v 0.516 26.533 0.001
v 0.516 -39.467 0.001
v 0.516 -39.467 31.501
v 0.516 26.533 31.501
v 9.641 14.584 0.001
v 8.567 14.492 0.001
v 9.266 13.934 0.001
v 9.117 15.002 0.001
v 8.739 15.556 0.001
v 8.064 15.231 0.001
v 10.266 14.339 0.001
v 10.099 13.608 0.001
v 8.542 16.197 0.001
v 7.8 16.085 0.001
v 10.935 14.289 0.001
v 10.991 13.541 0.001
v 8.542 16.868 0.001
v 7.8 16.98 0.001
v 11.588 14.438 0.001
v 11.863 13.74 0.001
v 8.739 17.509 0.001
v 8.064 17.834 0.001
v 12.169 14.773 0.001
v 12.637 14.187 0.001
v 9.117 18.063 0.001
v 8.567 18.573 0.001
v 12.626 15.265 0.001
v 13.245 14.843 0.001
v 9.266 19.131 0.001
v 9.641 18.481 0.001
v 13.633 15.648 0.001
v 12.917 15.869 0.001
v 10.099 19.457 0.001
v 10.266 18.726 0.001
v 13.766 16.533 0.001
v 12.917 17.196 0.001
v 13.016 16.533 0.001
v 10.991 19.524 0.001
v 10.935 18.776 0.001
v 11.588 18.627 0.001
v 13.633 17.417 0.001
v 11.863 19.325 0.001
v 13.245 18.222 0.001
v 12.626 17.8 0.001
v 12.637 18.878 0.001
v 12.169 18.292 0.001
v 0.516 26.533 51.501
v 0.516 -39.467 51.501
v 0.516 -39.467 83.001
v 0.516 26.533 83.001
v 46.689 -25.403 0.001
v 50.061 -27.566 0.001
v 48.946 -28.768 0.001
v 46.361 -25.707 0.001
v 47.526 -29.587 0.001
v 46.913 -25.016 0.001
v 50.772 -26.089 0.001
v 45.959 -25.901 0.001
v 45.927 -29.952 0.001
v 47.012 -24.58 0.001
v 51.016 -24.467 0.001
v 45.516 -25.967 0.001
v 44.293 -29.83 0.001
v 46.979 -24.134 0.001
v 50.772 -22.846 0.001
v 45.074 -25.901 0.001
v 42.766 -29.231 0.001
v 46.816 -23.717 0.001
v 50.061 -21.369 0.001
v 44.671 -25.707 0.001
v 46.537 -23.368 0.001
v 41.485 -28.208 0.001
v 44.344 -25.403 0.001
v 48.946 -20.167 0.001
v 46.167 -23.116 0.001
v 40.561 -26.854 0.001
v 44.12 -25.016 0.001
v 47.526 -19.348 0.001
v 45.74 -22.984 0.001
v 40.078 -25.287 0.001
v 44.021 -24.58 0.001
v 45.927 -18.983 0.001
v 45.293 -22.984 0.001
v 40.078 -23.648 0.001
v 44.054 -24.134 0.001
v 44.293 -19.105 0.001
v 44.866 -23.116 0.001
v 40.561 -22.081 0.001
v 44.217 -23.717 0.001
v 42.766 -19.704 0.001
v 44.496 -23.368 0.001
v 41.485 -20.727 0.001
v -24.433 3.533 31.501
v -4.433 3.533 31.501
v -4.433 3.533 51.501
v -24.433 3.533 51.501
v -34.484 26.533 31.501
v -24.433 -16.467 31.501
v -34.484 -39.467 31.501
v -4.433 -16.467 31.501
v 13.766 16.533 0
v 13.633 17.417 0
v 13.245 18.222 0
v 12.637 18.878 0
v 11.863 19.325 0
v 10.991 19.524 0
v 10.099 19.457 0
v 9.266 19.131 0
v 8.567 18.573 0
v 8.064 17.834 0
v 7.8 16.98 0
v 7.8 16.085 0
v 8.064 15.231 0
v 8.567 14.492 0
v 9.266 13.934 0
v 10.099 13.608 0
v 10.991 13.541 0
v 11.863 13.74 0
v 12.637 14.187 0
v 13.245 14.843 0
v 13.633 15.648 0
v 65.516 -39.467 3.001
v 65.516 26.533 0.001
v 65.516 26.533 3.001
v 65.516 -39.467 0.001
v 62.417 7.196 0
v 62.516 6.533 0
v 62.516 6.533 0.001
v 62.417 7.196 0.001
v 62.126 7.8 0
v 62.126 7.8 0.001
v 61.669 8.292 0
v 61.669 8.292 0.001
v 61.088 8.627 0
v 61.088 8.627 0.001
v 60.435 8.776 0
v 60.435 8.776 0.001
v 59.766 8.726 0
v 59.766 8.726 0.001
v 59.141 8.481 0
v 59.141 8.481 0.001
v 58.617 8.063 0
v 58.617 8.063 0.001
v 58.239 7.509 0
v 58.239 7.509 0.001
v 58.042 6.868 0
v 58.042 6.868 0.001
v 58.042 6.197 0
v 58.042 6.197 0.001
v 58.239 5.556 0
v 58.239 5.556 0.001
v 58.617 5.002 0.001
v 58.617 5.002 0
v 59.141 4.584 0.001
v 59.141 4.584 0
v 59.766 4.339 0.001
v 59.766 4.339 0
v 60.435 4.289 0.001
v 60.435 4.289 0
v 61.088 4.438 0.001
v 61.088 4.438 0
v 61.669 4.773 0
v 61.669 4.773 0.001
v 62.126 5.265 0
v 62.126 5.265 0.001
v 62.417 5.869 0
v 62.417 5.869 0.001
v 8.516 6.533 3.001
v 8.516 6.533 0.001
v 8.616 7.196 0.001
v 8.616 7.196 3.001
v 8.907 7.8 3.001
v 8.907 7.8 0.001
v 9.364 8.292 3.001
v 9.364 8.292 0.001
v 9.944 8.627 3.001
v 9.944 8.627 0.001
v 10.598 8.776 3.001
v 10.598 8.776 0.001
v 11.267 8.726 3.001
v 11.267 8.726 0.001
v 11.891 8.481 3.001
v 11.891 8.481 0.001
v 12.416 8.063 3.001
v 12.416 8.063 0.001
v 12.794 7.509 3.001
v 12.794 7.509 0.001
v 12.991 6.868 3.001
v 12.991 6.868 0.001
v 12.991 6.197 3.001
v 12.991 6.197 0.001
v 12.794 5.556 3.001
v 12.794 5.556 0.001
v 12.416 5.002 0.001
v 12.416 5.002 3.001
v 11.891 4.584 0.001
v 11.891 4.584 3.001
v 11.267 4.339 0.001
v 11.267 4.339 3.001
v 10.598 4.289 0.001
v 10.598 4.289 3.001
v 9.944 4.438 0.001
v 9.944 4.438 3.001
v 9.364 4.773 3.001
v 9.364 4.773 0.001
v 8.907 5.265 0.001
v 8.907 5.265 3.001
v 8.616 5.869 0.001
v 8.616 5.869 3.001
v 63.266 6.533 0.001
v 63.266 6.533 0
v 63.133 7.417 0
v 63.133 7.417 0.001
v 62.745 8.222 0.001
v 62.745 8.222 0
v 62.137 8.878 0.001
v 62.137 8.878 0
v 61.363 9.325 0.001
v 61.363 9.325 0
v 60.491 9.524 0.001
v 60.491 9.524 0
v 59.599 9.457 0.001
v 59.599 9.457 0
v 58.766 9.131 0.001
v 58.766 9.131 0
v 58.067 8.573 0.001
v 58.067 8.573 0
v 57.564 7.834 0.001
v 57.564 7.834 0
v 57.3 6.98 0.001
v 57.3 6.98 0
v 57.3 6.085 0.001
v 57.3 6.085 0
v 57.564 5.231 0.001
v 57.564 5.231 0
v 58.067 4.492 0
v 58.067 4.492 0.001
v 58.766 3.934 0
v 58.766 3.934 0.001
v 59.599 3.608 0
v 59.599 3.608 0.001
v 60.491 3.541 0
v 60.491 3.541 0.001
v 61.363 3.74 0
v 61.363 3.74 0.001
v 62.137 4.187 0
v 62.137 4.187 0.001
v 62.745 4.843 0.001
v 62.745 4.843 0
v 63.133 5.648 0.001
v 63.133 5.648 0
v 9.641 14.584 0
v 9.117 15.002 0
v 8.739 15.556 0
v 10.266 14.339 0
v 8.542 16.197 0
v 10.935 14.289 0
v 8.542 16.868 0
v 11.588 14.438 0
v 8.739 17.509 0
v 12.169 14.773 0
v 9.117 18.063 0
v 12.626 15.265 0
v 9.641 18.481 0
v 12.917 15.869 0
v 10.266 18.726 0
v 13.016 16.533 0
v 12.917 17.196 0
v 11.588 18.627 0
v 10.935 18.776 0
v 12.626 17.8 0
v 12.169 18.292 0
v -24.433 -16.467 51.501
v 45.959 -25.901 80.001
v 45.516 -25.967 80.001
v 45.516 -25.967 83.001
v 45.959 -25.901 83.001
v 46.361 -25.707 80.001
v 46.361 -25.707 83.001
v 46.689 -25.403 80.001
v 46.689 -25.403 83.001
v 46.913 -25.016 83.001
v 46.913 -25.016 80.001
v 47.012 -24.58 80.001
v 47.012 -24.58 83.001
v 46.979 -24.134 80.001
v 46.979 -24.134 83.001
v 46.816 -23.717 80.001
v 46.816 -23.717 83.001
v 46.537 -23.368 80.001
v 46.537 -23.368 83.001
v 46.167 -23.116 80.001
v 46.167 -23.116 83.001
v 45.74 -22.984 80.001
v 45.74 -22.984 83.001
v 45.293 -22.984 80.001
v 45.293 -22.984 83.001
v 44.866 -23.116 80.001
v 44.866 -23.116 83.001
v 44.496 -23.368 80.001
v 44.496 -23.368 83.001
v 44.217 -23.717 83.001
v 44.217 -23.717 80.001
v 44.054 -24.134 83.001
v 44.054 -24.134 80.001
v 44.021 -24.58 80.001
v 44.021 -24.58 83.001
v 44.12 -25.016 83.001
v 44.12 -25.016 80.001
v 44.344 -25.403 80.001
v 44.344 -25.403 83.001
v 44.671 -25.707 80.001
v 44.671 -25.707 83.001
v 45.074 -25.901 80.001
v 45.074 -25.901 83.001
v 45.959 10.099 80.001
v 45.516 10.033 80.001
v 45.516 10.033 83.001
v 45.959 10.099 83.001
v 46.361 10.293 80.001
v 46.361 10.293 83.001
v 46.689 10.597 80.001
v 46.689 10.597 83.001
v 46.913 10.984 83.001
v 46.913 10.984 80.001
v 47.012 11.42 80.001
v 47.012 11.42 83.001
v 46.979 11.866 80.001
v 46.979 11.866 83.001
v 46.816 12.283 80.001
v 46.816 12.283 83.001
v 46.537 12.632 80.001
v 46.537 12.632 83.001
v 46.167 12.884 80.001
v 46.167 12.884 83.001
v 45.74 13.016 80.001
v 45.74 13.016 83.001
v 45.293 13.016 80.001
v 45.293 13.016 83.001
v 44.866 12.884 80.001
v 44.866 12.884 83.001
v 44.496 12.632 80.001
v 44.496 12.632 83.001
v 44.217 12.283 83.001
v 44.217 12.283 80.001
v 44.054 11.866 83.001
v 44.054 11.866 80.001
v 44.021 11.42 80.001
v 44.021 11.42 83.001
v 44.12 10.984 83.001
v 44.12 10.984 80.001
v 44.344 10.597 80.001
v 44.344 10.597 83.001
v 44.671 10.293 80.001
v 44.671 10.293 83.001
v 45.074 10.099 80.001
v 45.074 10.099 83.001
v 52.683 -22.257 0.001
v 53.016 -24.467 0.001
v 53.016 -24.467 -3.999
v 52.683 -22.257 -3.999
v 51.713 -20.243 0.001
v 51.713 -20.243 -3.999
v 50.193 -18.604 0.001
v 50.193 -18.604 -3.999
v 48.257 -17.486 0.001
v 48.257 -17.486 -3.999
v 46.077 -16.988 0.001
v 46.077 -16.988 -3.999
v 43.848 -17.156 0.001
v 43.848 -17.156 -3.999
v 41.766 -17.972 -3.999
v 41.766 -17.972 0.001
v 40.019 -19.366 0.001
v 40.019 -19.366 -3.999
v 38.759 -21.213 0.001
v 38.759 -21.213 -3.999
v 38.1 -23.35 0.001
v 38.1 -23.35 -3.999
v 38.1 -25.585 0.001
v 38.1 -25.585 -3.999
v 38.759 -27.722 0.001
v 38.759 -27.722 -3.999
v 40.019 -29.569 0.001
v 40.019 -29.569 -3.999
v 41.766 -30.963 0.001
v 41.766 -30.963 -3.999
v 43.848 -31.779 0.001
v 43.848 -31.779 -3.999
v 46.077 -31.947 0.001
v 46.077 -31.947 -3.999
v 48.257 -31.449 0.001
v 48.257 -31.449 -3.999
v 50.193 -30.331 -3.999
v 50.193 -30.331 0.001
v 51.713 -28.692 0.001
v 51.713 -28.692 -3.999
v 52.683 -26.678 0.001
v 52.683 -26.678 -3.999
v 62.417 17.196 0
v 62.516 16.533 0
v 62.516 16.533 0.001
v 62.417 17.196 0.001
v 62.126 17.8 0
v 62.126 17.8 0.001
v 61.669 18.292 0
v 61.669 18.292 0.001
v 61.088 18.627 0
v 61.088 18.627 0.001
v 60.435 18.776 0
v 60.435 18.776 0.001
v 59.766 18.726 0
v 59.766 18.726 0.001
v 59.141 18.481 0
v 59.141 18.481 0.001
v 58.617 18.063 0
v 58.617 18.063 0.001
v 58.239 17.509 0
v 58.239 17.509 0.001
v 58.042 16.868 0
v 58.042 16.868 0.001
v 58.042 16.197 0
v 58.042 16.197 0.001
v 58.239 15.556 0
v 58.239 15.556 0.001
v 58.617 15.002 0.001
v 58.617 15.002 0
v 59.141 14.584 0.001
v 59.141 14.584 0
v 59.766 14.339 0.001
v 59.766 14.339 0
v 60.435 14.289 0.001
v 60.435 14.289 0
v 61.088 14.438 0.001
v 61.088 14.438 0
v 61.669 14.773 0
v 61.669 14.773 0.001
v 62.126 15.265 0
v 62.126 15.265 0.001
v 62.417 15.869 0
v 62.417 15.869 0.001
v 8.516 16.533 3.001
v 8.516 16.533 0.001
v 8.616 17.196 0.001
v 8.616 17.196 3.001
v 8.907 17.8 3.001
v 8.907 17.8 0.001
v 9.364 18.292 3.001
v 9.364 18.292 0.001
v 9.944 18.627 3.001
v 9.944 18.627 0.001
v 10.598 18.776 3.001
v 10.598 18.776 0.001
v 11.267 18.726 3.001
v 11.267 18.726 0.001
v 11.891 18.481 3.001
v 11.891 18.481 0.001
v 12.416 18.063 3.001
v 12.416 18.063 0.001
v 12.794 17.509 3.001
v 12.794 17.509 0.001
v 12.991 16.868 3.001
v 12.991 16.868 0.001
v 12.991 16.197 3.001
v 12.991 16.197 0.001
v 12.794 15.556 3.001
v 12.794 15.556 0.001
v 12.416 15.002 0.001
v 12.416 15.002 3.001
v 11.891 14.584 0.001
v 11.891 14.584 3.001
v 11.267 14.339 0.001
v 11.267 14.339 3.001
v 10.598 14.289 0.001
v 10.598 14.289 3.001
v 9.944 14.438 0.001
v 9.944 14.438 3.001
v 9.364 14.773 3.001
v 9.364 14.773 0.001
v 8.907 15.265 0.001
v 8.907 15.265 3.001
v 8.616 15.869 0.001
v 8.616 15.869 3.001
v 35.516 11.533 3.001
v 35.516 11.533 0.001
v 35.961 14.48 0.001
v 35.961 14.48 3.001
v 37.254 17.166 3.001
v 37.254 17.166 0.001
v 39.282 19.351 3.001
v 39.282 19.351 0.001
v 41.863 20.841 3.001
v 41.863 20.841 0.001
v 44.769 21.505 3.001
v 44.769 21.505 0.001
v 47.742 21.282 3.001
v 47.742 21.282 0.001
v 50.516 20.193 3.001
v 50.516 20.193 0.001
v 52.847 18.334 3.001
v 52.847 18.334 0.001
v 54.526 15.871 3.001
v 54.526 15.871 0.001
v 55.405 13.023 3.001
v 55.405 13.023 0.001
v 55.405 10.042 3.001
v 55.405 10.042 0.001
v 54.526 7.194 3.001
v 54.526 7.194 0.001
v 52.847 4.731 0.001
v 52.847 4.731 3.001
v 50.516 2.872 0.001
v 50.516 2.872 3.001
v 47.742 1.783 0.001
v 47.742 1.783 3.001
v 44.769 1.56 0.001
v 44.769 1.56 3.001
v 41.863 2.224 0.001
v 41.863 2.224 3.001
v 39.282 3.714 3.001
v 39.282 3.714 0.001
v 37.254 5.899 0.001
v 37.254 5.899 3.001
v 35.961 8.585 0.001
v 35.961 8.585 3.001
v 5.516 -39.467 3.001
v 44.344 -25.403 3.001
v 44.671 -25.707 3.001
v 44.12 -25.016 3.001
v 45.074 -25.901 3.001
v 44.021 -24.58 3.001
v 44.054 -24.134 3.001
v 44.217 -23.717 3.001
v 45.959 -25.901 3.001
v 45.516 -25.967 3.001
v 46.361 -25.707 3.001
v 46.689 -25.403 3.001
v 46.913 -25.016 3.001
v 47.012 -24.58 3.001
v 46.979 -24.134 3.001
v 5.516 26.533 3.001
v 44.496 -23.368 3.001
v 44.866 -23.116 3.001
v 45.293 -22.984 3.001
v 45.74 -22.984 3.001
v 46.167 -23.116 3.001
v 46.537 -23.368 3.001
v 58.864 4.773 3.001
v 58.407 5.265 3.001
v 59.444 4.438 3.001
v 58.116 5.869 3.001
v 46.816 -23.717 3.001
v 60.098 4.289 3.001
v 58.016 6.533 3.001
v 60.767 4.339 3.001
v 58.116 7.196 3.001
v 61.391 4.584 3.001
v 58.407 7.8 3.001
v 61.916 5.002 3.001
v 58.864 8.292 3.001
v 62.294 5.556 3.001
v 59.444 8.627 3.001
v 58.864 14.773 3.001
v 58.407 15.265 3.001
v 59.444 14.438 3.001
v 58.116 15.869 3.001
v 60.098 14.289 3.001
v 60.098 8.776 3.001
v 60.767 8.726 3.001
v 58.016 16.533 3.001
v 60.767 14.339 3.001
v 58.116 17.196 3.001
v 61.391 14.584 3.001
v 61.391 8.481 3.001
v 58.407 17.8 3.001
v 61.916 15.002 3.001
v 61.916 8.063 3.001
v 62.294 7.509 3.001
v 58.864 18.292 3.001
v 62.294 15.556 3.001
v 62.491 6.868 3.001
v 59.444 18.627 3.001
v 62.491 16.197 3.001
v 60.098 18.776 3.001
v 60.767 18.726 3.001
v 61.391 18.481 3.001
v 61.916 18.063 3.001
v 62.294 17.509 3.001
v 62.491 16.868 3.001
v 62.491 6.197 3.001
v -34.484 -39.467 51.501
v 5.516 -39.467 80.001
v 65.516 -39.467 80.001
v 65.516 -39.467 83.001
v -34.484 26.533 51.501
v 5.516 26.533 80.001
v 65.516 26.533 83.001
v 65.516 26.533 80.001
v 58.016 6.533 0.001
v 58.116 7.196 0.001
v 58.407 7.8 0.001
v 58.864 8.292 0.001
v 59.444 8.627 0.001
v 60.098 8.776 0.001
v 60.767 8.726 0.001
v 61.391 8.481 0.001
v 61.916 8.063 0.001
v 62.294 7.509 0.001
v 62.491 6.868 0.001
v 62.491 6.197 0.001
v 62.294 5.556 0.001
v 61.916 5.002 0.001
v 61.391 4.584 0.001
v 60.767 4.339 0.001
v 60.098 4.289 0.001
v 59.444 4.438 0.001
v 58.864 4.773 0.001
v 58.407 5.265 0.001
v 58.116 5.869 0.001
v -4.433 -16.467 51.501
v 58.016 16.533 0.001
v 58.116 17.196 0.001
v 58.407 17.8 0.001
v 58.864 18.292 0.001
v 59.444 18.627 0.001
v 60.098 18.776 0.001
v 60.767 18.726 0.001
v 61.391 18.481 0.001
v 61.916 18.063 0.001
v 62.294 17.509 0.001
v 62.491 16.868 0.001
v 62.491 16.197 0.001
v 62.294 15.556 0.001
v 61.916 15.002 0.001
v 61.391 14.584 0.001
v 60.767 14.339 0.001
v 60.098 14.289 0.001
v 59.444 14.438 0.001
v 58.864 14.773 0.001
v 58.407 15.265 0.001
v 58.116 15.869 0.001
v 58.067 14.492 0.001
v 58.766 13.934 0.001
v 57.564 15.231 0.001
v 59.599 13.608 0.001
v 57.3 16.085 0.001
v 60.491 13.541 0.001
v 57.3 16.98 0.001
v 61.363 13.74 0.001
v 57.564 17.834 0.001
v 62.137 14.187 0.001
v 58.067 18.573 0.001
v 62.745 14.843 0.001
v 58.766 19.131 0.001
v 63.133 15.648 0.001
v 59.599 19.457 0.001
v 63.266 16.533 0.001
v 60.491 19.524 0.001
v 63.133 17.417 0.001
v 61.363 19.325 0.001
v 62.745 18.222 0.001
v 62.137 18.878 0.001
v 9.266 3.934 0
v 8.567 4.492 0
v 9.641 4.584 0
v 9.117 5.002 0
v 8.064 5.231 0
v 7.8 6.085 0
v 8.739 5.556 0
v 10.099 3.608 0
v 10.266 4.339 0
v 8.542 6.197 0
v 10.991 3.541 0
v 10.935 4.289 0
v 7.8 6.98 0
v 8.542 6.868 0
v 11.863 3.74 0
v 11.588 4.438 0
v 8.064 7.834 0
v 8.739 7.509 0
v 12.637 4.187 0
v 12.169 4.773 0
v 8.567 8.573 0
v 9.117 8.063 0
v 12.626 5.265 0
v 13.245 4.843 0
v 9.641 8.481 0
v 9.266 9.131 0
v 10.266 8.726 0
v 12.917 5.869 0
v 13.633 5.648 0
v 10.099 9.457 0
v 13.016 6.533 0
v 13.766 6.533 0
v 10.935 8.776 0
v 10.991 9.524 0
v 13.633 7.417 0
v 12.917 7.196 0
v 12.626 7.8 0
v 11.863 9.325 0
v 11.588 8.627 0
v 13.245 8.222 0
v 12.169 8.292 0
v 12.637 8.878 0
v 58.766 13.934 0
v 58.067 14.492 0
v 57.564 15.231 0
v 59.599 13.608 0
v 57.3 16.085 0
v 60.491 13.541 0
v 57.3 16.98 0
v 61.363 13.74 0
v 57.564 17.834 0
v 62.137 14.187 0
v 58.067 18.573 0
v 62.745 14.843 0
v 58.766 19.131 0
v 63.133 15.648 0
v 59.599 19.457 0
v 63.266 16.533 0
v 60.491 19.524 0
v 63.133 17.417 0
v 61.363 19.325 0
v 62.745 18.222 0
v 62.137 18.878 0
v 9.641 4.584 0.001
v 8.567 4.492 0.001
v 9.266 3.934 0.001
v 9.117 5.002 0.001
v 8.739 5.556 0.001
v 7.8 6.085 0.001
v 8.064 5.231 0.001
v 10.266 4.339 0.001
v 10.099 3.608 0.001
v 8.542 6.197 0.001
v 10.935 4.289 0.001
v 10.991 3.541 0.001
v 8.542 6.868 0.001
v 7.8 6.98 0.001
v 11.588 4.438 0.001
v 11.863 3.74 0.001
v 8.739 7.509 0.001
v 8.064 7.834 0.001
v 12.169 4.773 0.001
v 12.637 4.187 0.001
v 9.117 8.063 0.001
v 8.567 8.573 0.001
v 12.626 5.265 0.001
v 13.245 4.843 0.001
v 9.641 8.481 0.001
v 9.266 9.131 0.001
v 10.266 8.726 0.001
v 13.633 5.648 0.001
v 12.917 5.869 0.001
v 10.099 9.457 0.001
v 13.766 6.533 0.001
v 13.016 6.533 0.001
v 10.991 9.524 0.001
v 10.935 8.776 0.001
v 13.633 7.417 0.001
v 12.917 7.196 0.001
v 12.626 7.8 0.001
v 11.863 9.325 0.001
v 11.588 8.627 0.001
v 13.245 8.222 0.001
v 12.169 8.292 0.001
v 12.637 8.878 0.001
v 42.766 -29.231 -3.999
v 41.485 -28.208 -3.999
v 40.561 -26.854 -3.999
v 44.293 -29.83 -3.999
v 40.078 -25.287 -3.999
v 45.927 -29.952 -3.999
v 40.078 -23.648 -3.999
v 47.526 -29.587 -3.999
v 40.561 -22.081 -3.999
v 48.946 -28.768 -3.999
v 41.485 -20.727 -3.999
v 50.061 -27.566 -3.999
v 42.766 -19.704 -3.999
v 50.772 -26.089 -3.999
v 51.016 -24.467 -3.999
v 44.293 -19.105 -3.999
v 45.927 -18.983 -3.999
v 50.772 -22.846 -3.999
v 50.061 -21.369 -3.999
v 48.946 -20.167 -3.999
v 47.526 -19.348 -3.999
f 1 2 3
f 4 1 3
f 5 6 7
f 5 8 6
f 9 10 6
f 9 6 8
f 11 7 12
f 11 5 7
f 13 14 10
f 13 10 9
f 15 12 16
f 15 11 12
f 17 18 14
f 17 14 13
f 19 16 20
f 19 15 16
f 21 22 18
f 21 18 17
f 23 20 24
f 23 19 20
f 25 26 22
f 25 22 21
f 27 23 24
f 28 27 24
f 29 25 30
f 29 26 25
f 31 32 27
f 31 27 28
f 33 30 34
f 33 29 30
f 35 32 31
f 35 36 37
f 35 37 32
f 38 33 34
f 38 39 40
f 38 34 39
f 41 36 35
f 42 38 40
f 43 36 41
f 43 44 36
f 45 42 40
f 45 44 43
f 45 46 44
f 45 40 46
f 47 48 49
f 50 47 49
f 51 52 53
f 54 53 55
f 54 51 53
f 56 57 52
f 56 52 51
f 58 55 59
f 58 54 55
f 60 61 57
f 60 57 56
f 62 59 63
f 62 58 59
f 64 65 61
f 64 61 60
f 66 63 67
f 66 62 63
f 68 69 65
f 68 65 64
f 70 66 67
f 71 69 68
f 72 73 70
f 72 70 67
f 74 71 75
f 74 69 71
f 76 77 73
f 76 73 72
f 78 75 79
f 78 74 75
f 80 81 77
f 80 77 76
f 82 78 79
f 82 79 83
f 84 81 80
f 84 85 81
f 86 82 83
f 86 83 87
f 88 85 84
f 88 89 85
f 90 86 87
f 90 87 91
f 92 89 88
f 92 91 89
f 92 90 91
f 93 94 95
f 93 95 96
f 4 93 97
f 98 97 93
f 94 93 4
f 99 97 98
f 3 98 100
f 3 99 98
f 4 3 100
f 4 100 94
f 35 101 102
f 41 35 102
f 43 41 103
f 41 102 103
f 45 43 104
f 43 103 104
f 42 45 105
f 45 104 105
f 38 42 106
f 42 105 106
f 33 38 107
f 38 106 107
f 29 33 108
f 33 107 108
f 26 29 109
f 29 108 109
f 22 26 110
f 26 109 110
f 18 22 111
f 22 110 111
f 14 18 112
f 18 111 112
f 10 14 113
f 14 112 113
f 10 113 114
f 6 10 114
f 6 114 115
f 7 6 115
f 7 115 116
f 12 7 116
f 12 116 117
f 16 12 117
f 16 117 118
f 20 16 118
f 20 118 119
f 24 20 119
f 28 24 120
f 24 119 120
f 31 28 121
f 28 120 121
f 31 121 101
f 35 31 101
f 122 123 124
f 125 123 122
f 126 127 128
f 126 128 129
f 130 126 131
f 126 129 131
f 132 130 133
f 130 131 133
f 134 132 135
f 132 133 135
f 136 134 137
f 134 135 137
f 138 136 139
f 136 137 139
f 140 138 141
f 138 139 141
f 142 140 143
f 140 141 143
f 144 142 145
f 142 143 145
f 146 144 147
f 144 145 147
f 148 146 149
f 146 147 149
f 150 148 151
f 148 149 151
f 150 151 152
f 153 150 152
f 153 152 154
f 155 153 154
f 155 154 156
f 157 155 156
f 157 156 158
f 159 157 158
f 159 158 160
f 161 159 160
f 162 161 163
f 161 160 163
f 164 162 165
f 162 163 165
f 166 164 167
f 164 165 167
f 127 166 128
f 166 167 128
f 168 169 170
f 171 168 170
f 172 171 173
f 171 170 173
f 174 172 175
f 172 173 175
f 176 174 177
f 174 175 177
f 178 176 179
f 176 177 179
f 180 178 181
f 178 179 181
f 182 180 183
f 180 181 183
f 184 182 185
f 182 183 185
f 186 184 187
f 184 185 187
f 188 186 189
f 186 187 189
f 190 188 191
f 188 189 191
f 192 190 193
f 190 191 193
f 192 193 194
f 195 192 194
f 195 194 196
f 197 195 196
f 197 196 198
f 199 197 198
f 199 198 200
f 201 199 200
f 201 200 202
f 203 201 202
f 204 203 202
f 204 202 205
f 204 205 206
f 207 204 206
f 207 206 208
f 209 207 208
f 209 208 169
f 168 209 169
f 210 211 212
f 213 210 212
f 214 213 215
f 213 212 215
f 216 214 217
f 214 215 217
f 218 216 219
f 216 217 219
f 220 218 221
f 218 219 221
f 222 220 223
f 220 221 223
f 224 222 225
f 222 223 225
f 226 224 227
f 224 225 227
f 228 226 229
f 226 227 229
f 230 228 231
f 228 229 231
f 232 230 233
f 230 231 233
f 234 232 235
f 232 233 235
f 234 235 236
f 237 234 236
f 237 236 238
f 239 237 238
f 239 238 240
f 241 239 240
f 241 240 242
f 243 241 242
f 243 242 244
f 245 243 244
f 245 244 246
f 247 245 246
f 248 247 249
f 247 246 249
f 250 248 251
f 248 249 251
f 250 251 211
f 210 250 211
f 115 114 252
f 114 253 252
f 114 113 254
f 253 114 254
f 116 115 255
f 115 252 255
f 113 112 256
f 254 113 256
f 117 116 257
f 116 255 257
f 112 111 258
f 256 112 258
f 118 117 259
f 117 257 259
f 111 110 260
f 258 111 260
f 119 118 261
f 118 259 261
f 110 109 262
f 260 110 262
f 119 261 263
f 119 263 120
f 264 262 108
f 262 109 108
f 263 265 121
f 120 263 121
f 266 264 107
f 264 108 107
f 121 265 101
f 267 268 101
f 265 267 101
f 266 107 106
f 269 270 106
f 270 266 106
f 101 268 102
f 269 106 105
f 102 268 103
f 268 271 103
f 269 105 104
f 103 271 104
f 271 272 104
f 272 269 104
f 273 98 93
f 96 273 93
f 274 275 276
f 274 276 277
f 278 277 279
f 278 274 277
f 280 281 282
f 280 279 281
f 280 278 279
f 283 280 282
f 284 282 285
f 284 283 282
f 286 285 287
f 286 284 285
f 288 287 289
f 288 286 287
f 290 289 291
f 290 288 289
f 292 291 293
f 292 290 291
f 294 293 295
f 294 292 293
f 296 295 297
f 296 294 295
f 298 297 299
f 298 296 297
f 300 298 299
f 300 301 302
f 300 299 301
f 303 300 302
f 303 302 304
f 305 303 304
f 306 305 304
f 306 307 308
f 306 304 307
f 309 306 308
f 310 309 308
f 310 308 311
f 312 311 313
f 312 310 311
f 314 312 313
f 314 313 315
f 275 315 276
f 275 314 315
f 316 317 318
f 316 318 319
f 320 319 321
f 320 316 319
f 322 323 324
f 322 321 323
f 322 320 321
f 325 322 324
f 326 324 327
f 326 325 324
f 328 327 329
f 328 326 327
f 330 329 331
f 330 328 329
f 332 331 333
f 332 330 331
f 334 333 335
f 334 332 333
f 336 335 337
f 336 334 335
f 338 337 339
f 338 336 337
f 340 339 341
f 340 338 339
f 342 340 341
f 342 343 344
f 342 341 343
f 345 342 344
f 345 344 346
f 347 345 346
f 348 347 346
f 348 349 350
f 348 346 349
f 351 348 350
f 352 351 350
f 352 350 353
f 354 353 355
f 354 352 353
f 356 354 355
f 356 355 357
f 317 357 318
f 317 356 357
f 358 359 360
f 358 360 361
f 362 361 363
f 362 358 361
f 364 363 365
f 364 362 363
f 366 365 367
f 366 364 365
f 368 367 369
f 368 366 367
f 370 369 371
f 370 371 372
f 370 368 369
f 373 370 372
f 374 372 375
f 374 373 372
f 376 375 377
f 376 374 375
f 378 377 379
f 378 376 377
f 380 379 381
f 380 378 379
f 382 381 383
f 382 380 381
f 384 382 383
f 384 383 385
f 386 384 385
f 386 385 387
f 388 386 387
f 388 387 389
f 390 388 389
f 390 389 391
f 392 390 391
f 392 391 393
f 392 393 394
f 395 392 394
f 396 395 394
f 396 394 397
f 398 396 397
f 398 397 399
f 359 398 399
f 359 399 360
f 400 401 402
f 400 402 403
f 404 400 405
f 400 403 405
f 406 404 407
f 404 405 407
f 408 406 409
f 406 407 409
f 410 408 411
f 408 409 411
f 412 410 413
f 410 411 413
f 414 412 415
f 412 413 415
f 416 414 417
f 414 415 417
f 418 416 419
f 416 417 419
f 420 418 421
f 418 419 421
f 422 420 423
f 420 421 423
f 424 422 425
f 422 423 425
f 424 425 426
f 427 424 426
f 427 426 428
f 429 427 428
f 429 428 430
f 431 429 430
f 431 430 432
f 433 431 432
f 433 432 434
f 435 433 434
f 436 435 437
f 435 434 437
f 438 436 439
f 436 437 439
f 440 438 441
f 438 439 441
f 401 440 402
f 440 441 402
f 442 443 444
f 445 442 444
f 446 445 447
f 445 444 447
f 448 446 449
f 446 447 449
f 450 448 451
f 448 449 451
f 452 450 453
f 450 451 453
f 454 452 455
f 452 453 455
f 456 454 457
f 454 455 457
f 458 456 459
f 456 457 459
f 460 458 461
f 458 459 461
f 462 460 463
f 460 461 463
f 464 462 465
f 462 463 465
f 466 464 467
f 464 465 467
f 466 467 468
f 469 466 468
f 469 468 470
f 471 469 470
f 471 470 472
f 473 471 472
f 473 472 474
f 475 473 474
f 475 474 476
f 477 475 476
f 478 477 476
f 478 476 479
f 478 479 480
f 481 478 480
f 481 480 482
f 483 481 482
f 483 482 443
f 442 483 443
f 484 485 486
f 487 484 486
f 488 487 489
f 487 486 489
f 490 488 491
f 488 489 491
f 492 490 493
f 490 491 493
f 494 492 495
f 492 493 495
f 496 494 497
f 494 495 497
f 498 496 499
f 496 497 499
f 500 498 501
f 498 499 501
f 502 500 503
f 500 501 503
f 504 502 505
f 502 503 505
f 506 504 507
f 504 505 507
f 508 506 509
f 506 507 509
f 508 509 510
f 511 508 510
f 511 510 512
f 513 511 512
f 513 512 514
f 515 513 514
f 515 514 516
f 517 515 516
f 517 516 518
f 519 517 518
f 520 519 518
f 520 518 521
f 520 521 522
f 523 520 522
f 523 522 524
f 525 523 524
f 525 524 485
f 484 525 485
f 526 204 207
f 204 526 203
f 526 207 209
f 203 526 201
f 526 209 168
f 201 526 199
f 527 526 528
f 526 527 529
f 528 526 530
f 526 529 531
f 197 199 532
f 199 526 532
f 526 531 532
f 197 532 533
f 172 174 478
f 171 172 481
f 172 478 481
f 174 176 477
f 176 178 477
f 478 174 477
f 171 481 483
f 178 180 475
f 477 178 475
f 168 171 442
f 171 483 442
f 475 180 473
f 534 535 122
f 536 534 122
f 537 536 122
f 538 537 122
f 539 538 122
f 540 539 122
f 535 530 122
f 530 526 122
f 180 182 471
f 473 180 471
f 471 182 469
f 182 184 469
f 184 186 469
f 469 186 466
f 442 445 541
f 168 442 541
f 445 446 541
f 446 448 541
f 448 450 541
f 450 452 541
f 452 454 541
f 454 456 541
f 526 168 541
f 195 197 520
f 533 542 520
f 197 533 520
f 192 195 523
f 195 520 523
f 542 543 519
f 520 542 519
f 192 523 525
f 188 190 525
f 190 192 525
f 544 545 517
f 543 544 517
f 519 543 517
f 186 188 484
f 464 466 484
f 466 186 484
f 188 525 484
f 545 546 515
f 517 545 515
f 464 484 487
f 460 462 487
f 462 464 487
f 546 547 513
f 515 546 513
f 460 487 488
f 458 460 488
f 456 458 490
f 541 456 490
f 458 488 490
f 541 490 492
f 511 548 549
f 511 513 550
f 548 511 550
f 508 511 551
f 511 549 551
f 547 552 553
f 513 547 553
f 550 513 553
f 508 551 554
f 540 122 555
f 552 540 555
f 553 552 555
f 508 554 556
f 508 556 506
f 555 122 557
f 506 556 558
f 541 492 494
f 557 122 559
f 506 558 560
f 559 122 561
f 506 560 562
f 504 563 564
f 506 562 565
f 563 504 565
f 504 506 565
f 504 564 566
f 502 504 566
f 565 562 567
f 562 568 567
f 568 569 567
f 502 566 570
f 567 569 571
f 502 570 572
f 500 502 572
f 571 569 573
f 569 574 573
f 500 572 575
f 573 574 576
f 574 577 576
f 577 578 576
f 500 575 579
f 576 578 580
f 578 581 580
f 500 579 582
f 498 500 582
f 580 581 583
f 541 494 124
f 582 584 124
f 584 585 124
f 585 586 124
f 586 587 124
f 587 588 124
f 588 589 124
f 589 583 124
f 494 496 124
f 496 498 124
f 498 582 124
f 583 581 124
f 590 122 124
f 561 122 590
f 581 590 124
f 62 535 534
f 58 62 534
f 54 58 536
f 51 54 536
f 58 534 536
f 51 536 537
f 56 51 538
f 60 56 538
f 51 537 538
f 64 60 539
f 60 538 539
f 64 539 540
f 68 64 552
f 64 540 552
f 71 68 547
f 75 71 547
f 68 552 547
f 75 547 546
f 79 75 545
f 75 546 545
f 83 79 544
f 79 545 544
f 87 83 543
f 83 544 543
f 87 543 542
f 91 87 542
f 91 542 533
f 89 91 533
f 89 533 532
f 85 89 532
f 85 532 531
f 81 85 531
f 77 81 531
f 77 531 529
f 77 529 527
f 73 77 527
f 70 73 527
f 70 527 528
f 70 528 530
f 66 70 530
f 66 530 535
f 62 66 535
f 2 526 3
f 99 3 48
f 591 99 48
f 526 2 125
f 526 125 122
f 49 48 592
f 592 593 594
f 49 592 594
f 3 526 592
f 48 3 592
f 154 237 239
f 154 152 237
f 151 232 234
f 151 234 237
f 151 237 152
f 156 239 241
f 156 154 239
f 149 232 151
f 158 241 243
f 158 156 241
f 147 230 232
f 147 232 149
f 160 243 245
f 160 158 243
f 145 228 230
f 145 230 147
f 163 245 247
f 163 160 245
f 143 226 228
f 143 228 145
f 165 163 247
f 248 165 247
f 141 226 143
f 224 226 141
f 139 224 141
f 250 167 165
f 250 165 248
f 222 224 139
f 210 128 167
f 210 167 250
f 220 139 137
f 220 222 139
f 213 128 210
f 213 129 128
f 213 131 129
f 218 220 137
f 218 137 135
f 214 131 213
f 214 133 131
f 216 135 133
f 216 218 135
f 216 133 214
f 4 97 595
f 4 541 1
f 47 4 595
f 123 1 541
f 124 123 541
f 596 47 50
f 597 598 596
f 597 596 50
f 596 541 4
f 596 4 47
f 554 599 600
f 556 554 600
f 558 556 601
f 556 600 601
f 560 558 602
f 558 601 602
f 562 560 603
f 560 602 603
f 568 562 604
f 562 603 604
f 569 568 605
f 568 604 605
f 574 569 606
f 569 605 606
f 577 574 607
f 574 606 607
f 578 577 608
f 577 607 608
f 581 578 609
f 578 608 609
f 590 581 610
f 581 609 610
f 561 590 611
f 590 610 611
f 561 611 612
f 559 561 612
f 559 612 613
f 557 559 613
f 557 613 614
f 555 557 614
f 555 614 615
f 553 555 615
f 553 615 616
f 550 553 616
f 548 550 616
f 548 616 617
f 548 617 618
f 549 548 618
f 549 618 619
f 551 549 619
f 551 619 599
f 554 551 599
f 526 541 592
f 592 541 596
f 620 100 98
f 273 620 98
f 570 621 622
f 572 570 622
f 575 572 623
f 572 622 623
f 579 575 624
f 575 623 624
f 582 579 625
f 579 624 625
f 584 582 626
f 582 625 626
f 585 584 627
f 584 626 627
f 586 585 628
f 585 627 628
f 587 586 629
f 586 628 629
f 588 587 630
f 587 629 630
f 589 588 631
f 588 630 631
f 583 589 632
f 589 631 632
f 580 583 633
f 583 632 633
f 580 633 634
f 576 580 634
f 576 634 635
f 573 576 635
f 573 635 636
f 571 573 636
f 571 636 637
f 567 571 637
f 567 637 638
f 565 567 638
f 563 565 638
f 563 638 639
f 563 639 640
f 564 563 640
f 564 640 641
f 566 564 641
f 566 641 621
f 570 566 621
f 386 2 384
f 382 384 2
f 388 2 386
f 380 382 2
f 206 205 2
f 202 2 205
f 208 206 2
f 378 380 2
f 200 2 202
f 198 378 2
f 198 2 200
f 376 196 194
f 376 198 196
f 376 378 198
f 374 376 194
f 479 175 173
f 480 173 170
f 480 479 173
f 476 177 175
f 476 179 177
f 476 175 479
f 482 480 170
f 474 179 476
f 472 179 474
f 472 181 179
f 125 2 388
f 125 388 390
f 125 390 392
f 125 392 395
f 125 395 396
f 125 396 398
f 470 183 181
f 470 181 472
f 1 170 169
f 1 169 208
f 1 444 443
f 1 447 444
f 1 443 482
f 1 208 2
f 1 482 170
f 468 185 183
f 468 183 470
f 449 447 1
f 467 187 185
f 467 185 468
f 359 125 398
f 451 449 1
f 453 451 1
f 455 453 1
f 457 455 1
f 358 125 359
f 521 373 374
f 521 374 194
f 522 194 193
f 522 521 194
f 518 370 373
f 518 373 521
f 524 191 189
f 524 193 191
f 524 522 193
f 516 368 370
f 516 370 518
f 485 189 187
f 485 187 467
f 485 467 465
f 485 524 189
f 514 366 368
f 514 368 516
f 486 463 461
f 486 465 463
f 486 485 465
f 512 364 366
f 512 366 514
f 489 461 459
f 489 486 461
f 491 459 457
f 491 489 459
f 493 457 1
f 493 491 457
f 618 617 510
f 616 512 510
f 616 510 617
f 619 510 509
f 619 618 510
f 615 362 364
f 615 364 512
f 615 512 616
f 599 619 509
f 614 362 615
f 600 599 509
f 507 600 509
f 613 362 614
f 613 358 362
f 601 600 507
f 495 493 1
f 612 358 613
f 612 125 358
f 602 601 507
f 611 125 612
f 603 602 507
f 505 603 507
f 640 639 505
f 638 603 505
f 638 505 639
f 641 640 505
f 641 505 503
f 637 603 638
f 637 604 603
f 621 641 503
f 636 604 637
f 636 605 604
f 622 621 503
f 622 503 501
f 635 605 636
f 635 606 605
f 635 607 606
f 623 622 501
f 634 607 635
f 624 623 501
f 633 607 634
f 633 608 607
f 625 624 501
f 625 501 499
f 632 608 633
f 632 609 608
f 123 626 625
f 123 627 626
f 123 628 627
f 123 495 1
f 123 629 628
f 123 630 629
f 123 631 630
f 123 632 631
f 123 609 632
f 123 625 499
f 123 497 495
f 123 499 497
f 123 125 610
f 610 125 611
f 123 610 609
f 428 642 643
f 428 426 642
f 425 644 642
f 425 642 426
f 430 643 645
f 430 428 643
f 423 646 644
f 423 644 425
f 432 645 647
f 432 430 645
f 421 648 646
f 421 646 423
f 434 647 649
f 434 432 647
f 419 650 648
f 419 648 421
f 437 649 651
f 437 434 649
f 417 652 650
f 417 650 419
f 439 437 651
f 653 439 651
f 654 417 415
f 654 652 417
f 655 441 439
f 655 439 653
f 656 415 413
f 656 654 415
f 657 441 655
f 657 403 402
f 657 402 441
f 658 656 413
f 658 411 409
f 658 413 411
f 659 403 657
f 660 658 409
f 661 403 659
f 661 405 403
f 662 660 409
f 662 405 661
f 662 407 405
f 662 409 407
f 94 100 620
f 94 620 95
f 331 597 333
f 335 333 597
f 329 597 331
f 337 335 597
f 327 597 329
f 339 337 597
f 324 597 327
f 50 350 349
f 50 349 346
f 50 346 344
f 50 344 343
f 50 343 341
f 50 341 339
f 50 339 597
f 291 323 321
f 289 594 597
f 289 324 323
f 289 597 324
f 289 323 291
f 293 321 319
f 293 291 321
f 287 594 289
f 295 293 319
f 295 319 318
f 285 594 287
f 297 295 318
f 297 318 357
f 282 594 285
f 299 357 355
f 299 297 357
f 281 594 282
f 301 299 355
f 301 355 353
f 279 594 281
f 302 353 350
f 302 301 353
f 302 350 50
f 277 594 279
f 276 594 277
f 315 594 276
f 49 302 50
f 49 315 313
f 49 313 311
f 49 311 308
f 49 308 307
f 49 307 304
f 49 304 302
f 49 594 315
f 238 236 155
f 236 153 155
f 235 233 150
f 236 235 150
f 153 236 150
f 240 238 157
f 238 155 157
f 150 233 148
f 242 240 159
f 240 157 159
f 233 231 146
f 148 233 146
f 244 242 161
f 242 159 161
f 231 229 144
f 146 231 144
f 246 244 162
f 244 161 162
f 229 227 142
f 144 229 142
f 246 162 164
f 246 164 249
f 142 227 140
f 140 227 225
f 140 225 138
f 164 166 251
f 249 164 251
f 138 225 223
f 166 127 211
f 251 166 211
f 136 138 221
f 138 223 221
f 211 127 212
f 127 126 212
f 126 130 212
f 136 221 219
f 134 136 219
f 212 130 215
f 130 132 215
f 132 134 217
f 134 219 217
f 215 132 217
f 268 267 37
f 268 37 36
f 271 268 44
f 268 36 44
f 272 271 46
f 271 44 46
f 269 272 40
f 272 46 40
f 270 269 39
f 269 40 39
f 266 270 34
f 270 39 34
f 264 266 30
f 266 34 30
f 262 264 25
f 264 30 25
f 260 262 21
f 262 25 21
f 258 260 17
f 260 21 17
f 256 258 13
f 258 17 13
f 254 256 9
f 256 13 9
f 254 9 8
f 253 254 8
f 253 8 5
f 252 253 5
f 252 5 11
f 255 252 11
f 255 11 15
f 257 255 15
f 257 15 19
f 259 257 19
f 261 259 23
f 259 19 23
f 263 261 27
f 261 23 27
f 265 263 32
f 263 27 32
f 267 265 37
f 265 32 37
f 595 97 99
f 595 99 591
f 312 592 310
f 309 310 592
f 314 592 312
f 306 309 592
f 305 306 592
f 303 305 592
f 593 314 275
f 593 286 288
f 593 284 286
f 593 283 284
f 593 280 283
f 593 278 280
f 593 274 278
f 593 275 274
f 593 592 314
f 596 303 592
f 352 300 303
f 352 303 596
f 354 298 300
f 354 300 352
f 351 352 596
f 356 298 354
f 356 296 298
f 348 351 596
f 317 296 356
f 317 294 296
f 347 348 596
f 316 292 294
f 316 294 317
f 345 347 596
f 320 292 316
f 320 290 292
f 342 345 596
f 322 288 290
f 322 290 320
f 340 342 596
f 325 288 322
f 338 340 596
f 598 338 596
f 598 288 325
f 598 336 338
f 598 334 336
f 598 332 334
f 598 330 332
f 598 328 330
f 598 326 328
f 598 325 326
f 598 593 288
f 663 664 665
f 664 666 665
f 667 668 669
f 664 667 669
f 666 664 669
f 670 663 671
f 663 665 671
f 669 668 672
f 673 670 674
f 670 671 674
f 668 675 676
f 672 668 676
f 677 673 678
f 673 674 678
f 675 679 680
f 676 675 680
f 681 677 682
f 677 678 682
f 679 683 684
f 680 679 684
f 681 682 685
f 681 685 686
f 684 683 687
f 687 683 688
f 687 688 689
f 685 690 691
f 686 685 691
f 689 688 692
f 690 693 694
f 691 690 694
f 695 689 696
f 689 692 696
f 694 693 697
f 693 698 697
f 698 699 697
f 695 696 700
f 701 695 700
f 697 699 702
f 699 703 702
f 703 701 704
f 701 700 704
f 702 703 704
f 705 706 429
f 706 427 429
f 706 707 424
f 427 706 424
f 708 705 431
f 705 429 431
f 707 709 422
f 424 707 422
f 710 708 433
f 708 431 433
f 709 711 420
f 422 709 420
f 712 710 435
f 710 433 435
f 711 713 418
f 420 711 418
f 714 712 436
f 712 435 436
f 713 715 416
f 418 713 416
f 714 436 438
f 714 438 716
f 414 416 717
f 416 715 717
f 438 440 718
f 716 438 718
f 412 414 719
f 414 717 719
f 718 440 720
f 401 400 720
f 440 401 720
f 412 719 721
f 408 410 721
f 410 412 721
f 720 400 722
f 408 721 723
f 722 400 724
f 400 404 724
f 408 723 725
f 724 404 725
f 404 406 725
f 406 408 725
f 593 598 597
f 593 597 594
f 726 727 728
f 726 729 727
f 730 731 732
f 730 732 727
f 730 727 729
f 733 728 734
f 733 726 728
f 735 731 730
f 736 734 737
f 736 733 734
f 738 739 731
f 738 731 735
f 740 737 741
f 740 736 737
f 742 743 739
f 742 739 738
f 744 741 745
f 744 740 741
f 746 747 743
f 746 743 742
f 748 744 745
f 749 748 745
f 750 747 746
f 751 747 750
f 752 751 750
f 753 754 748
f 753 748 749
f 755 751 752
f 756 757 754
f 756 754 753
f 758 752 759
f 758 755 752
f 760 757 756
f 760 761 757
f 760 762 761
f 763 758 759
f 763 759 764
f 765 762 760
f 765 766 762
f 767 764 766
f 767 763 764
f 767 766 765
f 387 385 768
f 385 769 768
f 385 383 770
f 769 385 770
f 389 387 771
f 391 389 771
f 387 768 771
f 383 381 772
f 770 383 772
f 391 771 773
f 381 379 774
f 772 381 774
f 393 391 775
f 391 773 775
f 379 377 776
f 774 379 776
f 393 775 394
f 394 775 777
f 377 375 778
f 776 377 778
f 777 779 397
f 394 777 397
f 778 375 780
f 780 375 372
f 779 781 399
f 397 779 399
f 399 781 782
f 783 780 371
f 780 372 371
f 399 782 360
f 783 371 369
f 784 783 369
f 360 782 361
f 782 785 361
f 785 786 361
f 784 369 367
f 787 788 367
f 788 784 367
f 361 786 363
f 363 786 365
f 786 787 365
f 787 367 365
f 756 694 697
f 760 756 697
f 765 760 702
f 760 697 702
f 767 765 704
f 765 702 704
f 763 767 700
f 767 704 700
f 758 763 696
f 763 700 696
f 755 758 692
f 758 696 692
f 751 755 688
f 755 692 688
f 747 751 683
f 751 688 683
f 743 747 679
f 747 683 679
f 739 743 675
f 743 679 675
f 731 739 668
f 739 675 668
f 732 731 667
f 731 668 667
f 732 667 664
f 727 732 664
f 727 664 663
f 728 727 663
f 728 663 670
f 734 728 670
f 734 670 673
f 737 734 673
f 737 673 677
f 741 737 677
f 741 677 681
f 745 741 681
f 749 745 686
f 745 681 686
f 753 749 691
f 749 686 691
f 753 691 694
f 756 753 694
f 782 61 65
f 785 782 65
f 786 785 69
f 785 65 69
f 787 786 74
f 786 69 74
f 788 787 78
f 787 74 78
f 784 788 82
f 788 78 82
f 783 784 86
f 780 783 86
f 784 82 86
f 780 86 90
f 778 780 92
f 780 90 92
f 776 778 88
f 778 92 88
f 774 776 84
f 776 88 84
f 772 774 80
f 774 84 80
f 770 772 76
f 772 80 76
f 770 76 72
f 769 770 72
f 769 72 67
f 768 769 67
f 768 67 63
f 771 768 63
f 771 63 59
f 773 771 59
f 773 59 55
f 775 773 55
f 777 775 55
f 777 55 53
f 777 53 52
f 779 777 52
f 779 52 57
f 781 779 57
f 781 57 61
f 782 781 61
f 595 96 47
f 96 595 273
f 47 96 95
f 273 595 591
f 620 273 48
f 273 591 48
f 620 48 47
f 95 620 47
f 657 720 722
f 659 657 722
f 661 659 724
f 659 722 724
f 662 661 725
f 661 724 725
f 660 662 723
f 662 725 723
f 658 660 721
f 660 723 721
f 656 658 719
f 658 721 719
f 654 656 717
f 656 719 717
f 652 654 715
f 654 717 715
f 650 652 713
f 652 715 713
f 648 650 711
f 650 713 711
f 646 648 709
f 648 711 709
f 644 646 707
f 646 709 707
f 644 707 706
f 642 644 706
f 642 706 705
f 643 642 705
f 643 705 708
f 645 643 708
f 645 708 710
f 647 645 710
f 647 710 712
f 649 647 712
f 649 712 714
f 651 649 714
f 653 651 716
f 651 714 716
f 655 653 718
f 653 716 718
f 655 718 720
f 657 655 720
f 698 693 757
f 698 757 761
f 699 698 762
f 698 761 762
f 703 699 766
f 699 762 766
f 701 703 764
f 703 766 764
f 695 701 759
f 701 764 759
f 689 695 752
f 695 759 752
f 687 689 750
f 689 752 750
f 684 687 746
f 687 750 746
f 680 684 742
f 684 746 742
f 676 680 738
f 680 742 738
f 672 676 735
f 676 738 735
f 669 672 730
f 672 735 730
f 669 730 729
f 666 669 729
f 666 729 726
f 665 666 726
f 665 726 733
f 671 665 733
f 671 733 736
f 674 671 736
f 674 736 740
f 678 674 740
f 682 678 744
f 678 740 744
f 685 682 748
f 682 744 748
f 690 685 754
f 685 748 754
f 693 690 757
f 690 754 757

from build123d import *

# Parameters (mm, degrees)
SKETCH_3_R               = 3
EXTRUDE_6_DEPTH          = 0.001
EXTRUDE_6_2_DEPTH        = 0.001
EXTRUDE_6_3_DEPTH        = 0.001
EXTRUDE_6_4_DEPTH        = 0.001
CUT_EXTRUDE_2_DEPTH      = 67.213034483
CUT_EXTRUDE_2_DEPTH_BACK = 67.213034483
SKETCH_11_R              = 2.25
EXTRUDE_7_DEPTH          = 3
CUT_EXTRUDE_START        = -3
SKETCH_14_R              = 2.25
SKETCH_14_R_2            = 10
CUT_EXTRUDE_3_DEPTH      = 3
SKETCH_15_R              = 10
SKETCH_15_R_2            = 1.5
CUT_EXTRUDE_4_DEPTH      = 65
SKETCH_17_R              = 7.5
SKETCH_17_R_2            = 5.5
EXTRUDE_8_DEPTH          = 7
SKETCH_12_4_R            = 10
EXTRUDE_10_DEPTH         = 83
SKETCH_20_W              = 77
SKETCH_20_H              = 66
CUT_EXTRUDE_6_DEPTH      = 60
SKETCH_21_W              = 83
SKETCH_21_H              = 66
EXTRUDE_11_DEPTH         = 40
CUT_EXTRUDE_START_2      = -40
SKETCH_14_3_R            = 2.25
SKETCH_14_3_R_2          = 10
CUT_EXTRUDE_7_DEPTH      = 40
SKETCH_23_R              = 10
EXTRUDE_12_DEPTH         = 3
CUT_EXTRUDE_9_DEPTH      = 100
CUT_EXTRUDE_9_DEPTH_BACK = 100
SKETCH_22_R              = 1.5
SKETCH_25_W              = 20
SKETCH_25_H              = 20
CUT_EXTRUDE_10_DEPTH     = 100
SKETCH_28_W              = 35
SKETCH_28_H              = 31.5
CUT_EXTRUDE_12_DEPTH     = 125.649809312


with BuildPart() as part:
    # 草图3 → 凸台-拉伸6 (new body)
    with BuildSketch(Plane.XY):
        with Locations((60.266478541, 16.532501821)):
            Circle(SKETCH_3_R)
    extrude(amount=EXTRUDE_6_DEPTH)


with BuildPart() as body_2:
    # 草图3 → Extrude 6 2 (new body)
    with BuildSketch(Plane.XY):
        with Locations((60.266478541, 6.532501821)):
            Circle(SKETCH_3_R)
    extrude(amount=EXTRUDE_6_2_DEPTH)


with BuildPart() as body_3:
    # 草图3 → Extrude 6 3 (new body)
    with BuildSketch(Plane.XY):
        with Locations((10.766478541, 6.532501821)):
            Circle(SKETCH_3_R)
    extrude(amount=EXTRUDE_6_3_DEPTH)


with BuildPart() as body_4:
    # 草图3 → Extrude 6 4 (new body)
    with BuildSketch(Plane.XY):
        with Locations((10.766478541, 16.532501821)):
            Circle(SKETCH_3_R)
    extrude(amount=EXTRUDE_6_4_DEPTH)


with BuildPart() as cut_extrude_2_tool:
    # 草图11 → 切除-拉伸2 (new, two sides: drawn at the far end of the back side and taken through both)
    with BuildSketch(Plane.XY.offset(0.001).offset(-CUT_EXTRUDE_2_DEPTH_BACK)):
        with Locations((10.766478541, 16.532501821)):
            Circle(SKETCH_11_R)
        with Locations((10.766478541, 6.532501821)):
            Circle(SKETCH_11_R)
        with Locations((60.266478541, 16.532501821)):
            Circle(SKETCH_11_R)
        with Locations((60.266478541, 6.532501821)):
            Circle(SKETCH_11_R)
    extrude(amount=CUT_EXTRUDE_2_DEPTH + CUT_EXTRUDE_2_DEPTH_BACK)


with BuildPart() as part_1:
    add(part.part)

    # 切除-拉伸2: cut by cut_extrude_2_tool
    add(cut_extrude_2_tool.part, mode=Mode.SUBTRACT)


with BuildPart() as body_2_1:
    add(body_2.part)

    # 切除-拉伸2: cut by cut_extrude_2_tool
    add(cut_extrude_2_tool.part, mode=Mode.SUBTRACT)


with BuildPart() as body_3_1:
    add(body_3.part)

    # 切除-拉伸2: cut by cut_extrude_2_tool
    add(cut_extrude_2_tool.part, mode=Mode.SUBTRACT)


with BuildPart() as body_4_1:
    add(body_4.part)

    # 切除-拉伸2: cut by cut_extrude_2_tool
    add(cut_extrude_2_tool.part, mode=Mode.SUBTRACT)


with BuildPart() as body_5:
    # 草图12 → 凸台-拉伸7 (new body)
    with BuildSketch(Plane.XY.offset(0.001)):
        Polygon((5.516478541, 26.532501821), (65.516478541, 26.532501821), (65.516478541, -39.467498179), (5.516478541, -39.467498179), (5.516478541, 1.532501821), align=None)
    extrude(amount=EXTRUDE_7_DEPTH)

    # 草图14 → 切除-拉伸3 (cut)
    with BuildSketch(Plane(origin=(0, 0, 0.001), x_dir=(-1, 0, 0), z_dir=(0, 0, -1)).offset(CUT_EXTRUDE_START)):
        with Locations((-60.266478541, 6.532501821)):
            Circle(SKETCH_14_R)
        with Locations((-60.266478541, 16.532501821)):
            Circle(SKETCH_14_R)
        with Locations((-10.766478541, 6.532501821)):
            Circle(SKETCH_14_R)
        with Locations((-10.766478541, 16.532501821)):
            Circle(SKETCH_14_R)
        with Locations((-45.516478541, 11.532501821)):
            Circle(SKETCH_14_R_2)
    extrude(amount=CUT_EXTRUDE_3_DEPTH, mode=Mode.SUBTRACT)

    # 草图15 → 切除-拉伸4 (cut)
    with BuildSketch(Plane(origin=(0, 0, 0.001), x_dir=(-1, 0, 0), z_dir=(0, 0, -1))):
        with Locations((-45.516478541, 11.532501821)):
            Circle(SKETCH_15_R)
        with Locations((-45.516478541, -24.467498179)):
            Circle(SKETCH_15_R_2)
    extrude(amount=-CUT_EXTRUDE_4_DEPTH, mode=Mode.SUBTRACT)

    # 草图17 → 凸台-拉伸8 (add)
    with BuildSketch(Plane.XY.offset(3.001)):
        with Locations((45.516478541, -24.467498179)):
            Circle(SKETCH_17_R)
        with Locations((45.516478541, -24.467498179)):
            Circle(SKETCH_17_R_2, mode=Mode.SUBTRACT)
    extrude(amount=-EXTRUDE_8_DEPTH)

    # 草图12<4> → 凸台-拉伸10 (add)
    with BuildSketch(Plane.XY.offset(0.001)):
        Polygon((5.516478541, 26.532501821), (65.516478541, 26.532501821), (65.516478541, -39.467498179), (5.516478541, -39.467498179), (5.516478541, 1.532501821), align=None)
        with Locations((45.516478541, 11.532501821)):
            Circle(SKETCH_12_4_R, mode=Mode.SUBTRACT)
    extrude(amount=EXTRUDE_10_DEPTH)

    # 草图20 → 切除-拉伸6 (cut)
    with BuildSketch(Plane(origin=(65.516478541, 0, 0), x_dir=(0, 0, -1), z_dir=(1, 0, 0))):
        with Locations((-41.501, -6.467498179)):
            Rectangle(SKETCH_20_W, SKETCH_20_H)
    extrude(amount=-CUT_EXTRUDE_6_DEPTH, mode=Mode.SUBTRACT)


with BuildPart() as cut_extrude_6_piece_1:
    # of the separate pieces the step leaves, piece 1, a body of its own (cut_extrude_6_pieces)
    add(body_5.part.solids().sort_by_distance((5.516478541, 26.532501821, 0.001))[0])



with BuildPart() as cut_extrude_6_piece_2:
    # of the separate pieces the step leaves, piece 2, a body of its own (cut_extrude_6_pieces)
    add(body_5.part.solids().sort_by_distance((65.516478541, 26.532501821, 80.001))[0])


with BuildPart() as cut_extrude_6_piece_1_1:
    add(cut_extrude_6_piece_1.part)

    add(cut_extrude_6_piece_2.part)  # 凸台-拉伸11 merges 切除-拉伸6 piece 2
    # 草图21 → 凸台-拉伸11 (add)
    with BuildSketch(Plane.ZY.offset(-5.516478541)):
        with Locations((41.501, -6.467498179)):
            Rectangle(SKETCH_21_W, SKETCH_21_H)
    extrude(amount=EXTRUDE_11_DEPTH)

    # 草图14<3> → 切除-拉伸7 (cut)
    with BuildSketch(Plane(origin=(0, 0, 0.001), x_dir=(-1, 0, 0), z_dir=(0, 0, -1)).offset(CUT_EXTRUDE_START_2)):
        with Locations((-60.266478541, 6.532501821)):
            Circle(SKETCH_14_3_R)
        with Locations((-60.266478541, 16.532501821)):
            Circle(SKETCH_14_3_R)
        with Locations((-10.766478541, 6.532501821)):
            Circle(SKETCH_14_3_R)
        with Locations((-10.766478541, 16.532501821)):
            Circle(SKETCH_14_3_R)
        with Locations((-45.516478541, 11.532501821)):
            Circle(SKETCH_14_3_R_2)
    extrude(amount=CUT_EXTRUDE_7_DEPTH, mode=Mode.SUBTRACT)

    # 草图23 → 凸台-拉伸12 (add)
    with BuildSketch(Plane.XY.offset(83.001)):
        with Locations((45.516478541, 11.532501821)):
            Circle(SKETCH_23_R)
    extrude(amount=-EXTRUDE_12_DEPTH)

    # 草图22 → 切除-拉伸9 (cut, two sides: drawn at the far end of the back side and taken through both)
    with BuildSketch(Plane.XY.offset(3.001).offset(-CUT_EXTRUDE_9_DEPTH_BACK)):
        with Locations((45.516478541, 11.532501821)):
            Circle(SKETCH_22_R)
        with Locations((45.516478541, -24.467498179)):
            Circle(SKETCH_22_R)
    extrude(amount=CUT_EXTRUDE_9_DEPTH + CUT_EXTRUDE_9_DEPTH_BACK, mode=Mode.SUBTRACT)

    # 草图25 → 切除-拉伸10 (cut)
    with BuildSketch(Plane(origin=(0, 0, 0.001), x_dir=(-1, 0, 0), z_dir=(0, 0, -1))):
        with Locations((14.433410721, -6.467498179)):
            Rectangle(SKETCH_25_W, SKETCH_25_H)
    extrude(amount=-CUT_EXTRUDE_10_DEPTH, mode=Mode.SUBTRACT)

    # 草图28 → 切除-拉伸12 (cut, through all)
    with BuildSketch(Plane.XZ.offset(39.467498179)):
        with Locations((-16.983521459, 15.751)):
            Rectangle(SKETCH_28_W, SKETCH_28_H)
        with Locations((-16.983521459, 67.251)):
            Rectangle(SKETCH_28_W, SKETCH_28_H)
    extrude(amount=-CUT_EXTRUDE_12_DEPTH, mode=Mode.SUBTRACT)


solid = Compound([part_1.part, body_2_1.part, body_3_1.part, body_4_1.part, cut_extrude_6_piece_1_1.part])
